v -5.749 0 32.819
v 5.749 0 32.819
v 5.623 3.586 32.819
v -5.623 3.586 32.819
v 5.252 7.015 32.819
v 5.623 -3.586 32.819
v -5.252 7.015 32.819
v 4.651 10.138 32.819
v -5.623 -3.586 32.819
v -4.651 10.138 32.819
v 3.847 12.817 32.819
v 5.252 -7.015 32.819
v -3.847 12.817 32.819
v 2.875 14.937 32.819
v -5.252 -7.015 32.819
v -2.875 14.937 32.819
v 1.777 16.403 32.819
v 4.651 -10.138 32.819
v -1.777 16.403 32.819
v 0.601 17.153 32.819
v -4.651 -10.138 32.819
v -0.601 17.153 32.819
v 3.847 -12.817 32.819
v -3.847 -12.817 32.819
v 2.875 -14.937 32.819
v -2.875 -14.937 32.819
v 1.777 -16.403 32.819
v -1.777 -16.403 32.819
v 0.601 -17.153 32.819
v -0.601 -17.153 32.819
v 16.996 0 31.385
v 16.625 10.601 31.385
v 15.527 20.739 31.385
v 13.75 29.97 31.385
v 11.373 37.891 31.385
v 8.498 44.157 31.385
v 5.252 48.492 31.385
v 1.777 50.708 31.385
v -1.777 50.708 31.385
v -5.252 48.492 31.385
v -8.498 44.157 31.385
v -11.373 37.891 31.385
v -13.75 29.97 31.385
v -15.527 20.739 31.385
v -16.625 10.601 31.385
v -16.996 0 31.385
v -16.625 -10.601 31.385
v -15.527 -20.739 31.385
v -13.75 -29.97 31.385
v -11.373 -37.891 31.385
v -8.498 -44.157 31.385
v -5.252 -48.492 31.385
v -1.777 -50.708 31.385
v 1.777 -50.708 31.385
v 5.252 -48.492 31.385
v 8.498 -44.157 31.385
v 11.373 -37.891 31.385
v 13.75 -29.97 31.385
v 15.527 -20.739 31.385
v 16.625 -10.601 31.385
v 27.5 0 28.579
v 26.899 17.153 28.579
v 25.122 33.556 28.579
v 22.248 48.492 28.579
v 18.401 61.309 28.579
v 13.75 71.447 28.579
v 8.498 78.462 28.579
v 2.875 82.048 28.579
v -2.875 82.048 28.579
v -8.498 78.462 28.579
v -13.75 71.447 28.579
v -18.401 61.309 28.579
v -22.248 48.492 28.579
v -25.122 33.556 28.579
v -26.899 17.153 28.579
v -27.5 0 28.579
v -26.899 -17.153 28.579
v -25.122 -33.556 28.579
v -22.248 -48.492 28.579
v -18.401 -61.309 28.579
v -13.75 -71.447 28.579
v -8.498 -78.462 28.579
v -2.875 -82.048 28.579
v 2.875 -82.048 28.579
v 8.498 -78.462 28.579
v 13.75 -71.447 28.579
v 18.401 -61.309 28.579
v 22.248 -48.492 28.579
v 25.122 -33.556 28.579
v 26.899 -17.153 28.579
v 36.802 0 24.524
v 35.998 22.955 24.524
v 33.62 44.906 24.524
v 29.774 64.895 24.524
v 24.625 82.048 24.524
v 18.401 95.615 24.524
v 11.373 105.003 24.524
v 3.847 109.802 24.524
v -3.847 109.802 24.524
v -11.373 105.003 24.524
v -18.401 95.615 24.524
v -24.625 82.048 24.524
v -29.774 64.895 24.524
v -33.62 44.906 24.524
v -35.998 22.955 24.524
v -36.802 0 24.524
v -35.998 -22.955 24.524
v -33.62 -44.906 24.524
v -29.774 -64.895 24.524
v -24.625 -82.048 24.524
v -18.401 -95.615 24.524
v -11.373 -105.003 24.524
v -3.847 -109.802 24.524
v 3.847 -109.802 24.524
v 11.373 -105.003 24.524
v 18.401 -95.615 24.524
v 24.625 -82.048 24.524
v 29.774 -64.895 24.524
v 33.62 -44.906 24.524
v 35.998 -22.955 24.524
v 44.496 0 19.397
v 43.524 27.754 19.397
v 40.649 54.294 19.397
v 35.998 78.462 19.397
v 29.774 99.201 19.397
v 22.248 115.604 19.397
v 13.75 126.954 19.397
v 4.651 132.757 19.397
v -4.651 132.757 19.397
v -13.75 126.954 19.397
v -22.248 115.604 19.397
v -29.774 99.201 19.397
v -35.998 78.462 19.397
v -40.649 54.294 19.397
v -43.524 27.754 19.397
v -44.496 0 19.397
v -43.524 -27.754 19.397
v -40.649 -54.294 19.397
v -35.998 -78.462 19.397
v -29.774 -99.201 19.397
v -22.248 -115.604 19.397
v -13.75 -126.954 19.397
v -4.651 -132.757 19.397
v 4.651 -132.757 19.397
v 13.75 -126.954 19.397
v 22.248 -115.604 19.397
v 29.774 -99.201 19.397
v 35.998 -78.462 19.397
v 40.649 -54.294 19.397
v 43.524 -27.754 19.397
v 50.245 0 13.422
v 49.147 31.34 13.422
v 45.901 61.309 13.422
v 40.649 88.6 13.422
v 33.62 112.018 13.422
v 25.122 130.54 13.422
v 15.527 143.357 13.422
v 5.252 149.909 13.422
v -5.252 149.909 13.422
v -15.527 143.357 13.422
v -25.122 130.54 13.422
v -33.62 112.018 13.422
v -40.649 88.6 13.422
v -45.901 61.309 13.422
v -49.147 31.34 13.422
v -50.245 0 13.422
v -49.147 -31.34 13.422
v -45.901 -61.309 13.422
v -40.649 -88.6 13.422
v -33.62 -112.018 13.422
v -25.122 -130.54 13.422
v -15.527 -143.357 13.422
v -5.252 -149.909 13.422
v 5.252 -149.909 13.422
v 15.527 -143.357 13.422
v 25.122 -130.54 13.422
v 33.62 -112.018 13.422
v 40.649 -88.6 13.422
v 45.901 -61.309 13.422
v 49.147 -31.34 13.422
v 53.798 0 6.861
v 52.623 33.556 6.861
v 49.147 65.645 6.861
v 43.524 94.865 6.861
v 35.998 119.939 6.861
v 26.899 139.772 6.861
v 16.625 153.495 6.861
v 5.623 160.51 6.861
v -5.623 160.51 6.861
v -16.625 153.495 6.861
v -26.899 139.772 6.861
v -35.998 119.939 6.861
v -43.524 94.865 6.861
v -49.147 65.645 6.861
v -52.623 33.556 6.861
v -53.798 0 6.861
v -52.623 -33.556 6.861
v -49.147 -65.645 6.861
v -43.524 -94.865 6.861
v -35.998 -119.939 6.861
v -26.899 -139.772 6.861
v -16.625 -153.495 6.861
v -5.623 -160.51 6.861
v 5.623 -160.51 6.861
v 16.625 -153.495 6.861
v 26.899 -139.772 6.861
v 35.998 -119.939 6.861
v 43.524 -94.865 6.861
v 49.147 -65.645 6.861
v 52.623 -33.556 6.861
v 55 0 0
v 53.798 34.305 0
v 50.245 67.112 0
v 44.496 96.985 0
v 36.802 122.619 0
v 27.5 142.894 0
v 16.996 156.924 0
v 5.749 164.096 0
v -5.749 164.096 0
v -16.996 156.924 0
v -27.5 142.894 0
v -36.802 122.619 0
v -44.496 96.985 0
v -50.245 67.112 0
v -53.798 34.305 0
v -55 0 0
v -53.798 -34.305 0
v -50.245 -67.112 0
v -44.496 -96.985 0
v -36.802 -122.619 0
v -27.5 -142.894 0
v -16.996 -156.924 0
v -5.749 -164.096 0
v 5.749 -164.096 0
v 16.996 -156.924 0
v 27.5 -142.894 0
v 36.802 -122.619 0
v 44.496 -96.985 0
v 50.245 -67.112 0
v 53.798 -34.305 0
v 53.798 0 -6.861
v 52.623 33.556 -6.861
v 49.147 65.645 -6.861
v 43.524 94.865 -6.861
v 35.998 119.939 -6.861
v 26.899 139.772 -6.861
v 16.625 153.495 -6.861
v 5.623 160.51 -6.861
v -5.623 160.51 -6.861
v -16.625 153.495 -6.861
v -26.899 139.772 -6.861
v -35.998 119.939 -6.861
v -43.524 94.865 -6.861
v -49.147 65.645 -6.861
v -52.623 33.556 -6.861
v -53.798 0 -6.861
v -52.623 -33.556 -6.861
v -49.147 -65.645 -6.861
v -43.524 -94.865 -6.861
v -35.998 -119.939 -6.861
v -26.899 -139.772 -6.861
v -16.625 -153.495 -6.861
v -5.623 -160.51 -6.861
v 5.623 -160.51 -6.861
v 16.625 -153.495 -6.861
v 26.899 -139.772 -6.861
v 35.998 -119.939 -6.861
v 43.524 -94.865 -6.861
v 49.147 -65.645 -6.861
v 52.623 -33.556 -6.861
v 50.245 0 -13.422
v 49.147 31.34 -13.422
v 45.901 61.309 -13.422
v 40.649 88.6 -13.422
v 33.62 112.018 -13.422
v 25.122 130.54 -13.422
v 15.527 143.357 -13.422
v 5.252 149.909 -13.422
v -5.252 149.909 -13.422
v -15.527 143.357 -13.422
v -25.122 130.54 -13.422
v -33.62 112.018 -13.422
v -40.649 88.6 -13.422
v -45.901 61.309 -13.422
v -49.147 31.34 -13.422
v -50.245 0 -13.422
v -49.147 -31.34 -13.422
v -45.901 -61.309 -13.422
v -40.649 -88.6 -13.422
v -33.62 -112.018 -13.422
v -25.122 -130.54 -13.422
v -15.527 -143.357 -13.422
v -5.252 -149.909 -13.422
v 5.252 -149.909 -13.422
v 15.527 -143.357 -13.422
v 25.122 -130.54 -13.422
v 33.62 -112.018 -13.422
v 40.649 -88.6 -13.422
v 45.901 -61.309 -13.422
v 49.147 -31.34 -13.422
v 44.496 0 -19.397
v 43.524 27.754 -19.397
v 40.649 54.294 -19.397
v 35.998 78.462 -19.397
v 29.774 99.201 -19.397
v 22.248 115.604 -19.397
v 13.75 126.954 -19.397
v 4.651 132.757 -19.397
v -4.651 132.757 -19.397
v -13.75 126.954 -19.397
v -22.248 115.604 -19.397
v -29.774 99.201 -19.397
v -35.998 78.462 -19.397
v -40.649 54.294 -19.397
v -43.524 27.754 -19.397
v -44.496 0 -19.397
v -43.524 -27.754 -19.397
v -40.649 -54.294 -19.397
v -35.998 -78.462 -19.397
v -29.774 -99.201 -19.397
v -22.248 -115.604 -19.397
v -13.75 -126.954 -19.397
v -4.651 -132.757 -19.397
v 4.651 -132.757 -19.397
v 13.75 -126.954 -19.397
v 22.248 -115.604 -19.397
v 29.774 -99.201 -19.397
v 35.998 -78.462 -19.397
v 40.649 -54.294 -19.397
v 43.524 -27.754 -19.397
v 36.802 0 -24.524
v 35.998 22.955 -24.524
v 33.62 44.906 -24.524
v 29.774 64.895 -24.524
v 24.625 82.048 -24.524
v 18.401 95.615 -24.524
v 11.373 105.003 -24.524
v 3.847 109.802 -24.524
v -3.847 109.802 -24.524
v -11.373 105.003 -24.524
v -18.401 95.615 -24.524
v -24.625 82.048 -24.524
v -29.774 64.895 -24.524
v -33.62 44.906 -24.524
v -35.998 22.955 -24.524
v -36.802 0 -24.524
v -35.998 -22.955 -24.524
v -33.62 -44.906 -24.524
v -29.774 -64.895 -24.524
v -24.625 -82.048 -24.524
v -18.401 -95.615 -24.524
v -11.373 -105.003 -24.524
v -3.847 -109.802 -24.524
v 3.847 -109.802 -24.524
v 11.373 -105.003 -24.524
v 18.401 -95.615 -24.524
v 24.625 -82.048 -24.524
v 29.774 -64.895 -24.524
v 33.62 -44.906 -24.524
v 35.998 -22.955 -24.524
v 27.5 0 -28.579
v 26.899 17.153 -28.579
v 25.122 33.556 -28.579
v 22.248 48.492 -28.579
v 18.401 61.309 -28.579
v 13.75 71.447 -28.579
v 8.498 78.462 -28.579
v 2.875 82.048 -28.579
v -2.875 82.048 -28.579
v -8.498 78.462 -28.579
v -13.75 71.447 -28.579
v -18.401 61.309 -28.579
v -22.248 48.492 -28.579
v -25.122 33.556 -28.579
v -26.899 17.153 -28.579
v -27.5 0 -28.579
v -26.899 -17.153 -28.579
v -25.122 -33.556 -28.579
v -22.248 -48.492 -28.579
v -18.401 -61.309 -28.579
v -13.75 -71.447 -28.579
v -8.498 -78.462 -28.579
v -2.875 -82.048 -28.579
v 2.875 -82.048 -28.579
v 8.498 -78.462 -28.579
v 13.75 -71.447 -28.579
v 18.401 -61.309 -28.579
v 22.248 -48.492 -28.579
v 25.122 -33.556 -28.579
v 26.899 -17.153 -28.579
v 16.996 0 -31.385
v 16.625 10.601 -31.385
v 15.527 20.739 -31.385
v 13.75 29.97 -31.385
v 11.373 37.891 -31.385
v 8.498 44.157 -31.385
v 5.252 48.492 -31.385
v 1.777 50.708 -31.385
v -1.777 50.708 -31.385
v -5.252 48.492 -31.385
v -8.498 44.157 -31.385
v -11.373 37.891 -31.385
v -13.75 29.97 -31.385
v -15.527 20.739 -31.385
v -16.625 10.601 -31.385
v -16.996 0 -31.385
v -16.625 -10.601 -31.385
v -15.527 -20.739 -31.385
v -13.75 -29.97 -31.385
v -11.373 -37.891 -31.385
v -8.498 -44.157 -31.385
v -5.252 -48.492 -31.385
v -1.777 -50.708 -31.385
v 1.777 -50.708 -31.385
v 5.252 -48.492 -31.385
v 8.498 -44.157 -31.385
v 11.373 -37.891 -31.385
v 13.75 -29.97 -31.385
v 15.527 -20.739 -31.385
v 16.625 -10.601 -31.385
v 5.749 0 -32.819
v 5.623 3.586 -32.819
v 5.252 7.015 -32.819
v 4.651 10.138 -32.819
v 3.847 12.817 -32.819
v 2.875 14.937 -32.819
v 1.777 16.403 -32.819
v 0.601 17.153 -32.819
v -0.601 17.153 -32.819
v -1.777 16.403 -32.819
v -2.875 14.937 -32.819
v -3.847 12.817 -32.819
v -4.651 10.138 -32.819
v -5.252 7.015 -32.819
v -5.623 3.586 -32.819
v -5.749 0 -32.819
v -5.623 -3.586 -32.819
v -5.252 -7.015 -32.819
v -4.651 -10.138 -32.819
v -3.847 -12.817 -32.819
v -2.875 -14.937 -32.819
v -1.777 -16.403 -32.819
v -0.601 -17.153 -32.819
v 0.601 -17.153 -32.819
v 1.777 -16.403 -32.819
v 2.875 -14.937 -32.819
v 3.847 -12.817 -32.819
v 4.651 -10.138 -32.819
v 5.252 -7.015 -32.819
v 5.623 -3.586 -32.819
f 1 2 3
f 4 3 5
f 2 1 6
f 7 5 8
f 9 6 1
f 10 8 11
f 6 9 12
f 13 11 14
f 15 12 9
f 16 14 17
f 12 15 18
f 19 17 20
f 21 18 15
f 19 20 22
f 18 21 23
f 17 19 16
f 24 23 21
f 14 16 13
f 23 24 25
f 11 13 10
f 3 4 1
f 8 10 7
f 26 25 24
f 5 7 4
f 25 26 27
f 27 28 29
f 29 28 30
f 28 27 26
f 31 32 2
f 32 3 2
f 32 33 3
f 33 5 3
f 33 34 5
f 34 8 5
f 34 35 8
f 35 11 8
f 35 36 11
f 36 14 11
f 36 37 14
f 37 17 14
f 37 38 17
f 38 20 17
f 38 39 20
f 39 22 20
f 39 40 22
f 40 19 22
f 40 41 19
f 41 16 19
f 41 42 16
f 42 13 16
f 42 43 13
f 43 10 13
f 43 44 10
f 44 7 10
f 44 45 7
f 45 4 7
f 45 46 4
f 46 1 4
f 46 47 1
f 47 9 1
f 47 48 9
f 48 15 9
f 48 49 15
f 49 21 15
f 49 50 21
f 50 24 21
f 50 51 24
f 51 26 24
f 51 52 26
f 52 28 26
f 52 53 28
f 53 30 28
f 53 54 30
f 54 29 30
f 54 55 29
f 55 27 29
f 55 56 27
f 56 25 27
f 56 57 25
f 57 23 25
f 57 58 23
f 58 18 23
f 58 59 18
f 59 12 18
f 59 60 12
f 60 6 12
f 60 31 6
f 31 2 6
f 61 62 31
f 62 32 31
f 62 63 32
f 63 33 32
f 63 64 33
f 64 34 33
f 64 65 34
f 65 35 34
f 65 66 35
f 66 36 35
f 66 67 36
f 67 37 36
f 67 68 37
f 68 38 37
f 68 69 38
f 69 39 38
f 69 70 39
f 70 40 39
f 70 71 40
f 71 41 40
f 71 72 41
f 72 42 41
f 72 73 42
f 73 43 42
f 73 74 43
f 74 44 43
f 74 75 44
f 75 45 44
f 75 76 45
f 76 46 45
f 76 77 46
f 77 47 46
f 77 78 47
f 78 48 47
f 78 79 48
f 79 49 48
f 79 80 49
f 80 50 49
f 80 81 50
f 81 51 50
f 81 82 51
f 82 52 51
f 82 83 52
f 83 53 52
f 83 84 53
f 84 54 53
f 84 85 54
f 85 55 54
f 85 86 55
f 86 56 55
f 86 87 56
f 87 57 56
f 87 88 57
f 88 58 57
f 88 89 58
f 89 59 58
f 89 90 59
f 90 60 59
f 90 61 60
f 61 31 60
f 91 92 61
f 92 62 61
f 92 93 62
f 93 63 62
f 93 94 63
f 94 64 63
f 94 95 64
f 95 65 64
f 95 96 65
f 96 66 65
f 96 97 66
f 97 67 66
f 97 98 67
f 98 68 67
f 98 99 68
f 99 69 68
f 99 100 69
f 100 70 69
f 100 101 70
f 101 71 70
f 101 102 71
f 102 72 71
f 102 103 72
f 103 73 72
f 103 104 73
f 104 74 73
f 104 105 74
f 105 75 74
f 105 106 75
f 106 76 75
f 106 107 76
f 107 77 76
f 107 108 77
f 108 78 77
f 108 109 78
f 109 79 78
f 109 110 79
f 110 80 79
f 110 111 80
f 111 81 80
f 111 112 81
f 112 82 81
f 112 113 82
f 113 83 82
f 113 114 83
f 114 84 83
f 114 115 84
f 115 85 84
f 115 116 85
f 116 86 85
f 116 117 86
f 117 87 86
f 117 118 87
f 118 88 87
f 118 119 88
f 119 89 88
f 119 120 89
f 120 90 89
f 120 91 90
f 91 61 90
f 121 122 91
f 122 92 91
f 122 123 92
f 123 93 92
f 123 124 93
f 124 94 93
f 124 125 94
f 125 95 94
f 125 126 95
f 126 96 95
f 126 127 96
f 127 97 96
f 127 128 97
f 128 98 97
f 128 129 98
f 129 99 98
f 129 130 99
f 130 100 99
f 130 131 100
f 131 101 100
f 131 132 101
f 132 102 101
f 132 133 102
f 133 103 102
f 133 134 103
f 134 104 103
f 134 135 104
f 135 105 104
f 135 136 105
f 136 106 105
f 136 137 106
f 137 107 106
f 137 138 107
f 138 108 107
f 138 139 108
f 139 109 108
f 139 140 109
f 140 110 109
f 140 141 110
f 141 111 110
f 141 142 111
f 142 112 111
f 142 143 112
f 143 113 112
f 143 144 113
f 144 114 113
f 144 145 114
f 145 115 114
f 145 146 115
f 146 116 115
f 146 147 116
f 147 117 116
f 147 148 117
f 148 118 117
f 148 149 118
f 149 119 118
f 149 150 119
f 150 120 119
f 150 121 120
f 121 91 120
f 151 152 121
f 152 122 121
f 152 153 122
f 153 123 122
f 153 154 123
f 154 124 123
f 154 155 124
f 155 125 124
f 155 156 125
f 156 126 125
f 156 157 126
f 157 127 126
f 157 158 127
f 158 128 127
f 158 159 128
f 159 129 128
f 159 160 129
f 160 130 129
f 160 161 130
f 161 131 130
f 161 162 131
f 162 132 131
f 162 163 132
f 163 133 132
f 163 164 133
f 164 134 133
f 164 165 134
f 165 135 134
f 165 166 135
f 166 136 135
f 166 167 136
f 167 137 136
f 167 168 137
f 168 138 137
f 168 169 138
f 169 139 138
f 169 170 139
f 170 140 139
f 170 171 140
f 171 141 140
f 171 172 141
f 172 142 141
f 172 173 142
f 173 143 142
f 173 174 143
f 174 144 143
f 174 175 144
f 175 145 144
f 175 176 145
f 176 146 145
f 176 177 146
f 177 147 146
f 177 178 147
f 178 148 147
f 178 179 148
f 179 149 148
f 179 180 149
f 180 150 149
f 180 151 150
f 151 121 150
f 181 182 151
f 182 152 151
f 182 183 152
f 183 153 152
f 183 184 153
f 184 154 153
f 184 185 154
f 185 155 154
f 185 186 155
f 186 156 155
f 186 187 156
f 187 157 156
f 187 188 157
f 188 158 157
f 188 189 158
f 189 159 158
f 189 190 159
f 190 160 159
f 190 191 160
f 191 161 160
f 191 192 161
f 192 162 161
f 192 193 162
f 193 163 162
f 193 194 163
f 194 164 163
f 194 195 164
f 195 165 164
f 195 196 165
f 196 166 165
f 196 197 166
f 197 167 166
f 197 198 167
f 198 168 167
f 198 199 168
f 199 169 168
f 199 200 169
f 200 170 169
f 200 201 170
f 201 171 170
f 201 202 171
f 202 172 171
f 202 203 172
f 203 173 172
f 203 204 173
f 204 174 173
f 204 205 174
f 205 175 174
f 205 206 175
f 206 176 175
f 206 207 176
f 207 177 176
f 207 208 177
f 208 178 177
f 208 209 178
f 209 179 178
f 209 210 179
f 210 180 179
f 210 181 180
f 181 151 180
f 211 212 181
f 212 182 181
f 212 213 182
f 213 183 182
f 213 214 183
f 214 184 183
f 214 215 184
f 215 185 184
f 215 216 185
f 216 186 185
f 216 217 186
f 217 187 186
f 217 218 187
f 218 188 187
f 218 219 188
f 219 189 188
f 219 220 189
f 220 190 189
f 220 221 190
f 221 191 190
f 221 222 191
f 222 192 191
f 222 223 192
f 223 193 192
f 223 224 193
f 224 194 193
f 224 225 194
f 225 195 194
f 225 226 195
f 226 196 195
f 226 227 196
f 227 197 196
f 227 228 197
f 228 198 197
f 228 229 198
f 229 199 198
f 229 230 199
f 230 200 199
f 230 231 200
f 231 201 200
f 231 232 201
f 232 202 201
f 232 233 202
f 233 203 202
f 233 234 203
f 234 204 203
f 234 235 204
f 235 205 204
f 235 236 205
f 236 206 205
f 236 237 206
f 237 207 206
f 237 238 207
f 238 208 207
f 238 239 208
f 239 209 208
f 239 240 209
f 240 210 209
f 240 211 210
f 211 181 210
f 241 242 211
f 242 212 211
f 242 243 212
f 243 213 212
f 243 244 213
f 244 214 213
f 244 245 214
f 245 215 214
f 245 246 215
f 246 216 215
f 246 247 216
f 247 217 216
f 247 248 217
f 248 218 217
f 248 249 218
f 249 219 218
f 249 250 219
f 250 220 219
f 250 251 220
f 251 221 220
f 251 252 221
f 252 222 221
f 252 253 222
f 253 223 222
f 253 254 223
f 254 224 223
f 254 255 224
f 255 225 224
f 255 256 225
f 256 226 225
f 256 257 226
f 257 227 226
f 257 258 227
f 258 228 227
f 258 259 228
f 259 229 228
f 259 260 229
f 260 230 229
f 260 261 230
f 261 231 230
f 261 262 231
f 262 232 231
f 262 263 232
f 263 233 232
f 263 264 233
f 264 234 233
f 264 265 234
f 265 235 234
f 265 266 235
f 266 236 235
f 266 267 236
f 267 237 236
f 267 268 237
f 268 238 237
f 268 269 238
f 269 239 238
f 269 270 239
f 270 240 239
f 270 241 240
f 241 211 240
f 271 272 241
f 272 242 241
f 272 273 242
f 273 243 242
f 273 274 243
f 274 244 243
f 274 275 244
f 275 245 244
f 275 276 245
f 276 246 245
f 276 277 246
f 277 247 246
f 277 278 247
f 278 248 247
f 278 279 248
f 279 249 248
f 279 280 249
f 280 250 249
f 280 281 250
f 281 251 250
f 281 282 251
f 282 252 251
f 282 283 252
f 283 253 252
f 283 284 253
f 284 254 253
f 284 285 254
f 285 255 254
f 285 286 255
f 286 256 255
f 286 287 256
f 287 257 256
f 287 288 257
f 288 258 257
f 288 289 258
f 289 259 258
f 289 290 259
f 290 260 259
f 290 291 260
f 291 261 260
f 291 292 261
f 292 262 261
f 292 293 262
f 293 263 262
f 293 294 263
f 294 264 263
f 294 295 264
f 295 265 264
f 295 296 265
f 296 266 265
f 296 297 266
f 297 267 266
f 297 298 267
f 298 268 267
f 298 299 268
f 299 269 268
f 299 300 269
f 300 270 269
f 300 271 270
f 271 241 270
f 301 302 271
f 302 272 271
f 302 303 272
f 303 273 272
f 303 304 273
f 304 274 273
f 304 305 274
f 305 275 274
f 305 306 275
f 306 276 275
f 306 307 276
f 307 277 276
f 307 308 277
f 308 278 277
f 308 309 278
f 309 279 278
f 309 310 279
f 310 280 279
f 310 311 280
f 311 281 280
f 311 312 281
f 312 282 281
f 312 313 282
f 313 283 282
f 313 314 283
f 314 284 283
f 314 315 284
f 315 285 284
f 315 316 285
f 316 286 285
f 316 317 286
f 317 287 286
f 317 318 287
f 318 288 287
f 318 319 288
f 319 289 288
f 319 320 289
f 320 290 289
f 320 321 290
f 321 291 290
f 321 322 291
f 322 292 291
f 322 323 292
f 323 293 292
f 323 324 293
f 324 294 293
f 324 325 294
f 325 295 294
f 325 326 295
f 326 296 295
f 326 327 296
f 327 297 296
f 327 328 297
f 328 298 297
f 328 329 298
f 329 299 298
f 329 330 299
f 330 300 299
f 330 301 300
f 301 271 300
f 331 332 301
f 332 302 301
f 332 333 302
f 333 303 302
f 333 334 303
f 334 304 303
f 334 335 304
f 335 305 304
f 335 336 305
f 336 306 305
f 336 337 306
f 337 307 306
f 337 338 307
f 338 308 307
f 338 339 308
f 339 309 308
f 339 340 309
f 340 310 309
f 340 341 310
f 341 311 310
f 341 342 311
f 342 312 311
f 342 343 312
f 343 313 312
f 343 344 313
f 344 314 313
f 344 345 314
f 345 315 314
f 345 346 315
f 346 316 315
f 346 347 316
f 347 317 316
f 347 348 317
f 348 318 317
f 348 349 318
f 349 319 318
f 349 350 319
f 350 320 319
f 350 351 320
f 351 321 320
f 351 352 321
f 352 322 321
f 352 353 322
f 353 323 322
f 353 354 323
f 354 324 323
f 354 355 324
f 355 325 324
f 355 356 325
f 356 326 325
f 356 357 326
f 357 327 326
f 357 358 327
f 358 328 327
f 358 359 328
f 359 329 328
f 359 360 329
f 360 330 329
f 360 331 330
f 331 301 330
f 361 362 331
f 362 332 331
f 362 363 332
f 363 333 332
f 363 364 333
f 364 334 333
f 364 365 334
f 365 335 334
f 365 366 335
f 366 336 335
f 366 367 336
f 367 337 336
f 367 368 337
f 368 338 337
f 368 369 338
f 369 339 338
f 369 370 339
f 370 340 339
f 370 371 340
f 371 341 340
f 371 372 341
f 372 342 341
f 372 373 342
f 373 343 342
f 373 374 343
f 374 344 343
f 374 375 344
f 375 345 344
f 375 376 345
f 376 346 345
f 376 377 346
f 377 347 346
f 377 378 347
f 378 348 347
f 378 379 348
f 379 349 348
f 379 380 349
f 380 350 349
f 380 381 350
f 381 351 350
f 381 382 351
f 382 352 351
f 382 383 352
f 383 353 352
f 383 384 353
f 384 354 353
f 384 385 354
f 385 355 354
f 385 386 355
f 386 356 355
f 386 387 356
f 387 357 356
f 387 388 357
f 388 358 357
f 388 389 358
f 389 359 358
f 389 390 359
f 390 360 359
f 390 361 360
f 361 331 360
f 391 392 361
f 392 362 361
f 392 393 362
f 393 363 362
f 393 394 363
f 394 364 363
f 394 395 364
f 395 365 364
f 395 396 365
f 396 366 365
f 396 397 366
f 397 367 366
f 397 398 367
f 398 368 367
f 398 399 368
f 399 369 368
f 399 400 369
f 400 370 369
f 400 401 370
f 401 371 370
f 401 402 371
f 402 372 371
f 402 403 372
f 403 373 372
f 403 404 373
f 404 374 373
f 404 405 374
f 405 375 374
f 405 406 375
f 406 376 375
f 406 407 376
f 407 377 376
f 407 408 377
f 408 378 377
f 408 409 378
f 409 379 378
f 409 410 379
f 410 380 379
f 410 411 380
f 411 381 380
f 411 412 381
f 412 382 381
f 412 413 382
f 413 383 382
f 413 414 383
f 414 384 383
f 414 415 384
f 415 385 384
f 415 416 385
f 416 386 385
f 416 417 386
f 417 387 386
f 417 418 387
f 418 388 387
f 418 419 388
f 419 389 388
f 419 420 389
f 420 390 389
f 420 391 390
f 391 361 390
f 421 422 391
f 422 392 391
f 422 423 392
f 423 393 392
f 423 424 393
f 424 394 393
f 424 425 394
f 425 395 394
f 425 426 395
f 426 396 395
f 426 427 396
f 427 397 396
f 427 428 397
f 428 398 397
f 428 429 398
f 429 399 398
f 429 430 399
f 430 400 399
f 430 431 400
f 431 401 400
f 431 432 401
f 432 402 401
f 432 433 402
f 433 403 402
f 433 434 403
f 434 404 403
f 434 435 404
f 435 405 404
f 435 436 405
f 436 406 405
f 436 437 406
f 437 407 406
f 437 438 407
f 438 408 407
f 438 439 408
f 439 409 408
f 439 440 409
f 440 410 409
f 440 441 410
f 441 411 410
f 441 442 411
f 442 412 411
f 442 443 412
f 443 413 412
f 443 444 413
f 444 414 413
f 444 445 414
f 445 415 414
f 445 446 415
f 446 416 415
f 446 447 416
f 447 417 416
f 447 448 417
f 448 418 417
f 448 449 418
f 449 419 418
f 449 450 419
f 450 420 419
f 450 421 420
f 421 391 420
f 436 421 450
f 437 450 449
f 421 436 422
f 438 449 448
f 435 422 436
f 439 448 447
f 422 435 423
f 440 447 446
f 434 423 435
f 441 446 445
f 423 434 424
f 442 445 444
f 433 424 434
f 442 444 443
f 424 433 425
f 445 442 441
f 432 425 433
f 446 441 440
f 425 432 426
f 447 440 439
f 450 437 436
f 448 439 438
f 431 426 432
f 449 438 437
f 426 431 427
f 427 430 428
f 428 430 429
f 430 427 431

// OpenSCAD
// Generated by SolidPython 1.0.1 on 2020-07-29 00:46:46


scale(v = [5, 15, 3]) {
	sphere(r = 11);
}
/***********************************************
*********      SolidPython code:      **********
************************************************
 
# import packages: SolidPython
from solid import *
from solid.utils import *
from itertools import chain, combinations, permutations


class Resize:

    def __init__(self, scad_file):
        self.scad_file = scad_file
        #self.scad_file = import_scad(scad_file)
        # cone/cylinder param:
        self.r1 = 0
        self.r2 = 0
        self.h = 0
        # rectangular prism param:
        self.w = 0
        self.l = 0
        # ellipse param:
        self.r = 0

    # import OpenScad code (file name corresponds to shape)


    # classify shape + parameters
    def assign(self, param1, param2, param3):
        if self.scad_file == 'cone.scad':
            self.r1 = param1
            self.r2 = param2
            self.h = param3
        elif self.scad_file == 'cylinder.scad':
            self.r1 = param1
            self.r2 = param2
            self.h = param3
        elif self.scad_file == 'rectangularPrism.scad':
            self.h = param1
            self.l = param2
            self.w = param3
        else:
            self.r = param1
            self.h = param2

    # resize parameters
    def iterate(self):
        x = range(3, 20, 2)
        i = 1
        if self.scad_file == 'cone.scad':
            tempList = list(permutations(x, 2))
            for temp in tempList:
                param1 = temp[0]
                param2 = temp[1]
                filepath = 'produced_scad_files/' + 'cone' + str(param1) + '_' + str(param2) + '_' + '.scad'
                scad_render_to_file(cylinder(h=param1, r1=param2, r2=0), filepath)

        elif self.scad_file == 'cylinder.scad':
            tempList = list(permutations(x, 3))
            for temp in tempList:
                param1 = temp[0]
                param2 = temp[1]
                filepath = 'produced_scad_files/' + 'cylinder' + str(param1) + '_' + str(param2) + '_' + '.scad'
                scad_render_to_file(cylinder(h=param1, r1=param2, r2=param2), filepath)

        elif self.scad_file == 'rectangularPrism.scad':
            tempList = list(permutations(x, 3))
            for temp in tempList:
                param1 = temp[0]
                param2 = temp[1]
                param3 = temp[2]
                filepath = 'produced_scad_files/' + 'rectangularPrism' + str(param1) + '_' + str(param2) + '_' + str(
                    param3) + '.scad'
                scad_render_to_file(cube(size=(param1, param2, param3)), filepath)

        elif self.scad_file == 'ellipse.scad':
            tempList = list(permutations(x, 4))
            for temp in tempList:
                param1 = temp[0]
                param2 = temp[1]
                param3 = temp[2]
                param4 = temp[3]
                filepath = 'produced_scad_files/' + 'ellipse' + str(param1) + '_' + str(param2) + '_' + str(param3) + '_' + str(param4) + '.scad'
                scad_render_to_file(scale([param1, param2, param3])(sphere(r=param4)), filepath)

    def render_to_scadfile(self):
        scad_render_to_file(scad, 'example.scad') 
 
************************************************/
